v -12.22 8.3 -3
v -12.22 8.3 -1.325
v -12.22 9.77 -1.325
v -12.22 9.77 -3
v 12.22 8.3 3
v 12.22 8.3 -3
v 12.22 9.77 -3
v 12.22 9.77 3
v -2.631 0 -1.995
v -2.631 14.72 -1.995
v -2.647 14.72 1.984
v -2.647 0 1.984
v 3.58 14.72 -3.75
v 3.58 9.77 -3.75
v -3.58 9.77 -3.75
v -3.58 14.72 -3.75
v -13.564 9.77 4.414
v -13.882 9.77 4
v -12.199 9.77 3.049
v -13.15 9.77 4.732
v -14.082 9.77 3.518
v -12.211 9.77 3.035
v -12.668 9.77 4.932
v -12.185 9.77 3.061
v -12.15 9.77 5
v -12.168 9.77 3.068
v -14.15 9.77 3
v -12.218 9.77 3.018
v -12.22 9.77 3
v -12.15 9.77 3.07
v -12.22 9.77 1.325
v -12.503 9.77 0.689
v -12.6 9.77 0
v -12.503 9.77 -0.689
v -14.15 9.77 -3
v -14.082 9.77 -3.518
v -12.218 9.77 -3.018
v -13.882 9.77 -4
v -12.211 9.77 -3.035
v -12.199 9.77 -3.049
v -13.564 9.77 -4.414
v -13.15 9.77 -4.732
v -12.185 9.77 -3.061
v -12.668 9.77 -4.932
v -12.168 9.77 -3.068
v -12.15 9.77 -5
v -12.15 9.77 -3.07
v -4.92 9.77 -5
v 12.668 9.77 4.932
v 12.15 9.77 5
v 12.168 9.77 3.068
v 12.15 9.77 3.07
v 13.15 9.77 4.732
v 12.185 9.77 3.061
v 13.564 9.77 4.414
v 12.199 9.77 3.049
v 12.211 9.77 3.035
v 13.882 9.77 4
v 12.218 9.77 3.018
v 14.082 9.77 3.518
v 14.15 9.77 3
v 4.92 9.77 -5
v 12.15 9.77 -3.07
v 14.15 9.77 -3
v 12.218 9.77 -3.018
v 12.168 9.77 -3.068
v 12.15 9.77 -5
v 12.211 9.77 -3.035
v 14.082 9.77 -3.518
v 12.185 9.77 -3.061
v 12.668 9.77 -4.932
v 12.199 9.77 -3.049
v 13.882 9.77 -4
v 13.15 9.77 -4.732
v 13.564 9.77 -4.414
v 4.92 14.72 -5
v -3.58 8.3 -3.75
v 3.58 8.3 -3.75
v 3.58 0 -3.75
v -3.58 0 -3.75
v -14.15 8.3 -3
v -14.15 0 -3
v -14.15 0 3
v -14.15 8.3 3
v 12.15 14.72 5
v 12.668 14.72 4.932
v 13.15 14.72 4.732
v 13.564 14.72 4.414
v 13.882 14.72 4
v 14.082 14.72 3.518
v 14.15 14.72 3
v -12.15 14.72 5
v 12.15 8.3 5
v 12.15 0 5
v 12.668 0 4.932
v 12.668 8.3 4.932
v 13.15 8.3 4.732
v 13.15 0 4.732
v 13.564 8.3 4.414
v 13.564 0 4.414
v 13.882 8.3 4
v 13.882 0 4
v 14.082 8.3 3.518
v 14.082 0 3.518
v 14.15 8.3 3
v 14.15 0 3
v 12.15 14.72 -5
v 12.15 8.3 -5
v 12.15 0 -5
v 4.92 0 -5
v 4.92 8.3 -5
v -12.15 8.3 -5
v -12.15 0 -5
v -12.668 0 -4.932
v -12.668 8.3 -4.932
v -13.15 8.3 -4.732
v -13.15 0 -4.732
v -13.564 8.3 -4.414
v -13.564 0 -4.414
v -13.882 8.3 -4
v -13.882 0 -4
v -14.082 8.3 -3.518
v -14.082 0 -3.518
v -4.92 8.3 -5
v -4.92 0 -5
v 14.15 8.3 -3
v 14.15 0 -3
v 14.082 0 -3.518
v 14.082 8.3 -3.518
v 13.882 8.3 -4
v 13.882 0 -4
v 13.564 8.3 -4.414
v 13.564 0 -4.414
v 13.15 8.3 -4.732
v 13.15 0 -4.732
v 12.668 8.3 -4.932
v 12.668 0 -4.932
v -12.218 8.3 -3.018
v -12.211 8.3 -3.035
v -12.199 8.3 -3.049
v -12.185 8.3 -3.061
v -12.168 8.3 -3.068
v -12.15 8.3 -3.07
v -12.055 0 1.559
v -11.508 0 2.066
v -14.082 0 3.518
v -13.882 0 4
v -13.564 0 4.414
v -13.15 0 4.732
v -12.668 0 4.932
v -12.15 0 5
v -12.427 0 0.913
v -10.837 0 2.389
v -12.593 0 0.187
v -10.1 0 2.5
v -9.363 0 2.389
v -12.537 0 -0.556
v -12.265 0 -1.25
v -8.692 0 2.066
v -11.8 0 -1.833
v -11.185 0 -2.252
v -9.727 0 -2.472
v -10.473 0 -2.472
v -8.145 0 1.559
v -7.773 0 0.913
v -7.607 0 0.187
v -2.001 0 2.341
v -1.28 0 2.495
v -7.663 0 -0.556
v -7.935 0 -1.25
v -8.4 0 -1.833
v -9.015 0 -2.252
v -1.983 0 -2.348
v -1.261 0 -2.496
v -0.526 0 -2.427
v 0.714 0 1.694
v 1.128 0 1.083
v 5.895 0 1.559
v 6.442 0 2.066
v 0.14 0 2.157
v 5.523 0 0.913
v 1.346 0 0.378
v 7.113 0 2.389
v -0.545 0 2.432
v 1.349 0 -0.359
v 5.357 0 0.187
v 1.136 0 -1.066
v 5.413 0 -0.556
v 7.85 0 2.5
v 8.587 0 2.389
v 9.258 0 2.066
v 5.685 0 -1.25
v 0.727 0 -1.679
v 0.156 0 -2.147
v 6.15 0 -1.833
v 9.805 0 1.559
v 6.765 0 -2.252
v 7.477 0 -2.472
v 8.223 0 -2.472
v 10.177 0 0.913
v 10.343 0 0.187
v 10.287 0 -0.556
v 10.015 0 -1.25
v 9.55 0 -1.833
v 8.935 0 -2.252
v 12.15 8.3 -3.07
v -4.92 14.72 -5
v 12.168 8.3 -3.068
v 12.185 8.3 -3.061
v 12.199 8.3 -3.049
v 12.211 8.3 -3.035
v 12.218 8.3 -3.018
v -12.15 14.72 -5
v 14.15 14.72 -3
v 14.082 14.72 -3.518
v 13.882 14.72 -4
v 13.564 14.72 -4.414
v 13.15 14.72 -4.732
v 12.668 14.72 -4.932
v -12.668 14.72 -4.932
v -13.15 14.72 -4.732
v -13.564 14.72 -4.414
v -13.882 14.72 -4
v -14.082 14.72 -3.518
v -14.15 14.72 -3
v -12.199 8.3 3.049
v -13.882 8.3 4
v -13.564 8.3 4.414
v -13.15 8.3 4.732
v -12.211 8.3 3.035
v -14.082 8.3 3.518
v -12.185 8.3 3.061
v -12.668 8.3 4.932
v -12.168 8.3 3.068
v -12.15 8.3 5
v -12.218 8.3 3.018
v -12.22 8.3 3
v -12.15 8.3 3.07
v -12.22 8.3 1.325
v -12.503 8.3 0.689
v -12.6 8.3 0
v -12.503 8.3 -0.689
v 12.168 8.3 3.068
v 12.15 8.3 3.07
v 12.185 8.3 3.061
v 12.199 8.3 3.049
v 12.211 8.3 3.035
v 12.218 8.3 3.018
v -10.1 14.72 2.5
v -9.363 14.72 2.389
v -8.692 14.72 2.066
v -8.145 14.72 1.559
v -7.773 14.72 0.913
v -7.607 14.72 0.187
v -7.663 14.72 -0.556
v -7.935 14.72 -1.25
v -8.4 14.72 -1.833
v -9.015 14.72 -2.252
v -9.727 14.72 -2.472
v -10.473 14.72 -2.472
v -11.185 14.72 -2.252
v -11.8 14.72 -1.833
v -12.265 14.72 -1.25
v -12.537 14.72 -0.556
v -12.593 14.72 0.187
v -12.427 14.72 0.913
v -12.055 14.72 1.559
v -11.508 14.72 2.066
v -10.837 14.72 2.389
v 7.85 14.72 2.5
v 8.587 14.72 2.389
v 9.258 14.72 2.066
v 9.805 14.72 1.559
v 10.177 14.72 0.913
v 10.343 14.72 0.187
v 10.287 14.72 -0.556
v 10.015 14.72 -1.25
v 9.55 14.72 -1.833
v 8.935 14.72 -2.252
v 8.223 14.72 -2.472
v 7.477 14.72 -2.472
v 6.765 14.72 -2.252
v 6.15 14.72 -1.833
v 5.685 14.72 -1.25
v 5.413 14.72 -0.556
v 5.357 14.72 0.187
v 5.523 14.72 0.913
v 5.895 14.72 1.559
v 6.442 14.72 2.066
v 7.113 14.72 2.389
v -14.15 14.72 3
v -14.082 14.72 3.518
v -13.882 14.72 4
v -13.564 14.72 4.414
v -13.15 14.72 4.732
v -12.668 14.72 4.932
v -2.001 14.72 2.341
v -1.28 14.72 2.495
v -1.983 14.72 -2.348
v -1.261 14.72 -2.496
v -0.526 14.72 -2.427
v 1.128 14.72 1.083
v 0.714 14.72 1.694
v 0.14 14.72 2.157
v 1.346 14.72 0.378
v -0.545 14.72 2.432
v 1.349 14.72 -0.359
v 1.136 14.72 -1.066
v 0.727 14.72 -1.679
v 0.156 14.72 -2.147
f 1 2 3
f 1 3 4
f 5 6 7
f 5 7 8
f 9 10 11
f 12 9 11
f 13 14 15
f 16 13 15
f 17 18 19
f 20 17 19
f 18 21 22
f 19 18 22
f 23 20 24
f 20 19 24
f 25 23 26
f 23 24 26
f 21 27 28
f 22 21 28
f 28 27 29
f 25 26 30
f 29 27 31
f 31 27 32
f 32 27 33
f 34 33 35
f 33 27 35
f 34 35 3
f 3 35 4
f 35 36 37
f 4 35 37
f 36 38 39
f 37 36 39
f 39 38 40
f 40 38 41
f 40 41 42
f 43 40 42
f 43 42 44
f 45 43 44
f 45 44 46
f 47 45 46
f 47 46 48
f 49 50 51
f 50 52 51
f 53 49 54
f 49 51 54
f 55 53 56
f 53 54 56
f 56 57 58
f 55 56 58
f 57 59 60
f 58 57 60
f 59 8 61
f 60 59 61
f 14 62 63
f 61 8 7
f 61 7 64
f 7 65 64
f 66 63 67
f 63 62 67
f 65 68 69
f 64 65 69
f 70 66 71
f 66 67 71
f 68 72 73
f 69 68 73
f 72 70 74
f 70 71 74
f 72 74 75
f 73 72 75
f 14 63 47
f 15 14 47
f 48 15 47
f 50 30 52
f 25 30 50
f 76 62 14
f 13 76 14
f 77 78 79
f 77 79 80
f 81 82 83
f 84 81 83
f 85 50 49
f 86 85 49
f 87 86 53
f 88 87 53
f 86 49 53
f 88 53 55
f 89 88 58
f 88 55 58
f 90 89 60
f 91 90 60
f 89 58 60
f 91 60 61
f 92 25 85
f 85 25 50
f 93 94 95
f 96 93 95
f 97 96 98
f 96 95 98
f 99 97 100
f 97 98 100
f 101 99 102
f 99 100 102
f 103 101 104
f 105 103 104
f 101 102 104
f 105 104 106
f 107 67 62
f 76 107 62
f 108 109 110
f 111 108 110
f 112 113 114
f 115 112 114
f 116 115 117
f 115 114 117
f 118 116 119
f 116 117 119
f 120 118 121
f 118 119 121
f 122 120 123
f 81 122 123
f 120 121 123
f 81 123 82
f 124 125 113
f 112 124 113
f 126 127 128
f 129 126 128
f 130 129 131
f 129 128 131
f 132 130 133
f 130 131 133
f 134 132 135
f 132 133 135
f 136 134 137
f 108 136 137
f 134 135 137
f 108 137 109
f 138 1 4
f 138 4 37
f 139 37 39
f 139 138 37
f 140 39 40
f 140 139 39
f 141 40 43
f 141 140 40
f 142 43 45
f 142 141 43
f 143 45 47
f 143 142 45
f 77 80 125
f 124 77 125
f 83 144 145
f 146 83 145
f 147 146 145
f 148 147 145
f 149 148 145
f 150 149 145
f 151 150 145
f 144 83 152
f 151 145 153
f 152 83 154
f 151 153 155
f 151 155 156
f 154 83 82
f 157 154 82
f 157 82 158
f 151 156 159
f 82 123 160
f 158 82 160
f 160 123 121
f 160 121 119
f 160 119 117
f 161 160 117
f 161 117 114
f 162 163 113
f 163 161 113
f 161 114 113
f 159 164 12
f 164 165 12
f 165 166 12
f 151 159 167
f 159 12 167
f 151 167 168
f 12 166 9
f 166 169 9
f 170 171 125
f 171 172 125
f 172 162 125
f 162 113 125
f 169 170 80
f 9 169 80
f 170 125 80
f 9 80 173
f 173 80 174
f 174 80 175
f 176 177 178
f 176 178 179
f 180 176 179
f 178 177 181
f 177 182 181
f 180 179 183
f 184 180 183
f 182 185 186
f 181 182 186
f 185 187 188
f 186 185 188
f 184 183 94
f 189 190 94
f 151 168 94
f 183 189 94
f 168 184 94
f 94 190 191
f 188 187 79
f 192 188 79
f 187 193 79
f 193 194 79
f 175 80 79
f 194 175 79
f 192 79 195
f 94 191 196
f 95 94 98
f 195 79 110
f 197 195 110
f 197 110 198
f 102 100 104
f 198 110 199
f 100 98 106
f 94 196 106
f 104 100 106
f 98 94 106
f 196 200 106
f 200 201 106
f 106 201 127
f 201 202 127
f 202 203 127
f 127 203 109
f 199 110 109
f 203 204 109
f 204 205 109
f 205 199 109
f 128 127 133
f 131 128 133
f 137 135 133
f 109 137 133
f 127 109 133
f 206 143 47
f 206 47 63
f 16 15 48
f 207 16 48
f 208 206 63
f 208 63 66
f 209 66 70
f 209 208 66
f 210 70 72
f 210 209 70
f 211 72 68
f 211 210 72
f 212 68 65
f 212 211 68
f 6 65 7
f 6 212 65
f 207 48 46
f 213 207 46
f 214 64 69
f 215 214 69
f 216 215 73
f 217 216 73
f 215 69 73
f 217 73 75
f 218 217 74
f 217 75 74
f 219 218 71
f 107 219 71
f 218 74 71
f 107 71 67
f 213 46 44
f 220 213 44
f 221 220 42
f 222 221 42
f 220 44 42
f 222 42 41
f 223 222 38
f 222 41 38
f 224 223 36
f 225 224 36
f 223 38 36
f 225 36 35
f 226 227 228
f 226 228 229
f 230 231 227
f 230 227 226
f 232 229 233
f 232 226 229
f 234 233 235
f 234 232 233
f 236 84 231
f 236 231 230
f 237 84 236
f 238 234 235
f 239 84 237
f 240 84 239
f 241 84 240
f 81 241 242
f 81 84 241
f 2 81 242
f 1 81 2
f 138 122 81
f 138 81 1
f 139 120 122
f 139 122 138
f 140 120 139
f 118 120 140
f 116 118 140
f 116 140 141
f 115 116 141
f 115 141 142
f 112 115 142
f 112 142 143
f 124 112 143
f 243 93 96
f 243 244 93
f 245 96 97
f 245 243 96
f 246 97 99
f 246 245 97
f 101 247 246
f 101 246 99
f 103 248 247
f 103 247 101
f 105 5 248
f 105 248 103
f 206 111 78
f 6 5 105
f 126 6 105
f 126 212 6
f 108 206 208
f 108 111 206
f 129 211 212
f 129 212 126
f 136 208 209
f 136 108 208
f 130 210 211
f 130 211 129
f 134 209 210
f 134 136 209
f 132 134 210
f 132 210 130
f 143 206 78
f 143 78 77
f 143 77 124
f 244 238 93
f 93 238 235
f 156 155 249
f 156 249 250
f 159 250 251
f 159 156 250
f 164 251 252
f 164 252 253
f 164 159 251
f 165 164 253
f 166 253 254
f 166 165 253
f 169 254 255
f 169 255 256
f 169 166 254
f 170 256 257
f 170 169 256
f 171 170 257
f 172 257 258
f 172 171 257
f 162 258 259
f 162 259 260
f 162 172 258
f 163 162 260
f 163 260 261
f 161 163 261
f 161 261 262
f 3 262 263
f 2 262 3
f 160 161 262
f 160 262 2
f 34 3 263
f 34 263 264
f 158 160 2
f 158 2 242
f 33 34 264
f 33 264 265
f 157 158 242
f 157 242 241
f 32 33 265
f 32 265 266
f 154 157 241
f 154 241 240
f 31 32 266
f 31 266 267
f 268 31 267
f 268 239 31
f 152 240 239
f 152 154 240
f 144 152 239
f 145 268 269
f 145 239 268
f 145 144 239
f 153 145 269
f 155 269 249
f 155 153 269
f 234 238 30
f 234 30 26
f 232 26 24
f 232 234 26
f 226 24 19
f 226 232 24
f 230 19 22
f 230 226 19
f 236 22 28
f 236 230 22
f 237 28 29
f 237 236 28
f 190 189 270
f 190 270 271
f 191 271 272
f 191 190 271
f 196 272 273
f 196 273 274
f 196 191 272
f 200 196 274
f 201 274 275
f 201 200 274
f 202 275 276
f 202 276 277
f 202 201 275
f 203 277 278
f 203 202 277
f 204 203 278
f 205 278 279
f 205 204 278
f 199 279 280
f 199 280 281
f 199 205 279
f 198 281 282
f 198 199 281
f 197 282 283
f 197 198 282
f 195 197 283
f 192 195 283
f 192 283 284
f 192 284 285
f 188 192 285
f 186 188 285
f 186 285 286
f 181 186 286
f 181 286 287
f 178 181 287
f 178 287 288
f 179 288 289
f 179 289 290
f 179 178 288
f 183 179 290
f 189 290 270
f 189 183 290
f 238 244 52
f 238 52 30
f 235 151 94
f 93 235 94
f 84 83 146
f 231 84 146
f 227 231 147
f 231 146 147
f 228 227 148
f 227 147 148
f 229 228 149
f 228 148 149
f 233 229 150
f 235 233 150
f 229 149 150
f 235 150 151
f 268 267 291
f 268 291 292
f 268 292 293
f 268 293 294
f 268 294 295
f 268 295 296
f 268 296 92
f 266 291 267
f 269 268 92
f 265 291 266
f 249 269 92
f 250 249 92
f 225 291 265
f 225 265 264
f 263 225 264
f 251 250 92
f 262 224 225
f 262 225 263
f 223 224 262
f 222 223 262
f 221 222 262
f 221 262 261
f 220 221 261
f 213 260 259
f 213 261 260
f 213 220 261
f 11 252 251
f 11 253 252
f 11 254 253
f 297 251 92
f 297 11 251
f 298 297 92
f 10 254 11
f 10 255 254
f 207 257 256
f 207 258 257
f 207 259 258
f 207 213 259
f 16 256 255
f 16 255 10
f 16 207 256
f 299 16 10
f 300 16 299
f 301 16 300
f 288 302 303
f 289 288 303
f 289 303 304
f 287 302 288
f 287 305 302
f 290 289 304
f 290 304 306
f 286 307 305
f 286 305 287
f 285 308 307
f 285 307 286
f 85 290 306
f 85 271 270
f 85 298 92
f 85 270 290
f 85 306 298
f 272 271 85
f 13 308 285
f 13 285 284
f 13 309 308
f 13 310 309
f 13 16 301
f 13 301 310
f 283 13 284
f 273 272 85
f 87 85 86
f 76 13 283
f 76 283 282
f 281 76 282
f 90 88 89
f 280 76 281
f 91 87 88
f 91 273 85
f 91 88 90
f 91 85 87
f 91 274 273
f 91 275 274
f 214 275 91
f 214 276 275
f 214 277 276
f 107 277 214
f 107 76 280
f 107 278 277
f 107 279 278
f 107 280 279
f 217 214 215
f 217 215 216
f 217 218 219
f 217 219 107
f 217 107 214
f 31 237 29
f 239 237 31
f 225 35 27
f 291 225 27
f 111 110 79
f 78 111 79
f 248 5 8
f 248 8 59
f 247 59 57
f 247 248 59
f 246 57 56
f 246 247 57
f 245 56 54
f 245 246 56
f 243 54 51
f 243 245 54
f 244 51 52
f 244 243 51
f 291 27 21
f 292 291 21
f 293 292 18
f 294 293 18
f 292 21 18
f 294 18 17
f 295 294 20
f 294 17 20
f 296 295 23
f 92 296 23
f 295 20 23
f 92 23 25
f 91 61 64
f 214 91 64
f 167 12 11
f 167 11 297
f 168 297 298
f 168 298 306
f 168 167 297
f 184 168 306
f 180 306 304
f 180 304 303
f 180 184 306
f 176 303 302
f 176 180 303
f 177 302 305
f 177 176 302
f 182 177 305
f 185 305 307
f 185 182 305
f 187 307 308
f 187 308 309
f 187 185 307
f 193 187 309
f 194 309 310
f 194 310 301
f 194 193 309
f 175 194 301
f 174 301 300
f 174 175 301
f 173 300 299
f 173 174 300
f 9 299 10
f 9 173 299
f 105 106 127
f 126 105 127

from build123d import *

# Parameters (mm, degrees)
SKETCH1_R           = 2.5
BOSS_EXTRUDE2_DEPTH = 14.72
CUT_SWEEP1_START    = 8.3
CUT_SWEEP1_DEPTH    = 1.47


# Read off the part's stored shape, not the designer's step: Cut-Sweep1
with BuildPart() as part:
    # Sketch1 → Boss-Extrude2 (new body)
    with BuildSketch(Plane(origin=(0, 0, 0), x_dir=(1, 0, 0), z_dir=(0, 1, 0))):
        with BuildLine():
            Line((-12.15, -5), (12.15, -5))
            ThreePointArc((12.15, -5), (13.564213562, -4.414213562), (14.15, -3))
            Line((14.15, -3), (14.15, 3))
            ThreePointArc((14.15, 3), (13.564213562, 4.414213562), (12.15, 5))
            Line((12.15, 5), (4.92, 5))
            Line((4.92, 5), (3.58, 3.75))
            Line((3.58, 3.75), (-3.58, 3.75))
            Line((-3.58, 3.75), (-4.92, 5))
            Line((-4.92, 5), (-12.15, 5))
            ThreePointArc((-12.15, 5), (-13.564213562, 4.414213562), (-14.15, 3))
            Line((-14.15, 3), (-14.15, -3))
            ThreePointArc((-14.15, -3), (-13.564213562, -4.414213562), (-12.15, -5))
        make_face()
        with Locations(Location((7.85, 0, 0), (0, 0, 270))):
            Circle(SKETCH1_R, mode=Mode.SUBTRACT)
        with Locations(Location((-10.1, 0, 0), (0, 0, 270))):
            Circle(SKETCH1_R, mode=Mode.SUBTRACT)
        with BuildLine():
            Line((-2.631143176, 1.995377842), (-2.646508574, -1.983686381))
            ThreePointArc((-2.646508574, -1.983686381), (1.374981361, -0.00965383), (-2.631143176, 1.995377842))
        make_face(mode=Mode.SUBTRACT)
    extrude(amount=BOSS_EXTRUDE2_DEPTH)

    # Cut-Sweep1 outline → Cut-Sweep1 (cut)
    with BuildSketch(Plane(origin=(0, 0, 0), x_dir=(1, 0, 0), z_dir=(0, 1, 0)).offset(CUT_SWEEP1_START)):
        with BuildLine():
            ThreePointArc((-12.15, 5), (-13.564213562, 4.414213562), (-14.15, 3))
            Line((-14.15, 3), (-14.15, -3))
            ThreePointArc((-14.15, -3), (-13.564213562, -4.414213562), (-12.15, -5))
            Line((-12.15, -5), (12.15, -5))
            ThreePointArc((12.15, -5), (13.564213562, -4.414213562), (14.15, -3))
            Line((14.15, -3), (14.15, 3))
            ThreePointArc((14.15, 3), (13.564213562, 4.414213562), (12.15, 5))
            Line((12.15, 5), (4.92, 5))
            Line((4.92, 5), (3.58, 3.75))
            Line((3.58, 3.75), (-3.58, 3.75))
            Line((-3.58, 3.75), (-4.92, 5))
            Line((-4.92, 5), (-12.15, 5))
        make_face()
        with BuildLine():
            ThreePointArc((-12.22, -1.324990566), (-12.6, 0), (-12.22, 1.324990566))
            Line((-12.22, 1.324990566), (-12.22, 3))
            ThreePointArc((-12.22, 3), (-12.199497475, 3.049497475), (-12.15, 3.07))
            Line((-12.15, 3.07), (12.15, 3.07))
            ThreePointArc((12.15, 3.07), (12.199497475, 3.049497475), (12.22, 3))
            Line((12.22, 3), (12.22, -3))
            ThreePointArc((12.22, -3), (12.199497475, -3.049497475), (12.15, -3.07))
            Line((12.15, -3.07), (-12.15, -3.07))
            ThreePointArc((-12.15, -3.07), (-12.199497475, -3.049497475), (-12.22, -3))
            Line((-12.22, -3), (-12.22, -1.324990566))
        make_face(mode=Mode.SUBTRACT)
    extrude(amount=CUT_SWEEP1_DEPTH, mode=Mode.SUBTRACT)


solid = part.part
